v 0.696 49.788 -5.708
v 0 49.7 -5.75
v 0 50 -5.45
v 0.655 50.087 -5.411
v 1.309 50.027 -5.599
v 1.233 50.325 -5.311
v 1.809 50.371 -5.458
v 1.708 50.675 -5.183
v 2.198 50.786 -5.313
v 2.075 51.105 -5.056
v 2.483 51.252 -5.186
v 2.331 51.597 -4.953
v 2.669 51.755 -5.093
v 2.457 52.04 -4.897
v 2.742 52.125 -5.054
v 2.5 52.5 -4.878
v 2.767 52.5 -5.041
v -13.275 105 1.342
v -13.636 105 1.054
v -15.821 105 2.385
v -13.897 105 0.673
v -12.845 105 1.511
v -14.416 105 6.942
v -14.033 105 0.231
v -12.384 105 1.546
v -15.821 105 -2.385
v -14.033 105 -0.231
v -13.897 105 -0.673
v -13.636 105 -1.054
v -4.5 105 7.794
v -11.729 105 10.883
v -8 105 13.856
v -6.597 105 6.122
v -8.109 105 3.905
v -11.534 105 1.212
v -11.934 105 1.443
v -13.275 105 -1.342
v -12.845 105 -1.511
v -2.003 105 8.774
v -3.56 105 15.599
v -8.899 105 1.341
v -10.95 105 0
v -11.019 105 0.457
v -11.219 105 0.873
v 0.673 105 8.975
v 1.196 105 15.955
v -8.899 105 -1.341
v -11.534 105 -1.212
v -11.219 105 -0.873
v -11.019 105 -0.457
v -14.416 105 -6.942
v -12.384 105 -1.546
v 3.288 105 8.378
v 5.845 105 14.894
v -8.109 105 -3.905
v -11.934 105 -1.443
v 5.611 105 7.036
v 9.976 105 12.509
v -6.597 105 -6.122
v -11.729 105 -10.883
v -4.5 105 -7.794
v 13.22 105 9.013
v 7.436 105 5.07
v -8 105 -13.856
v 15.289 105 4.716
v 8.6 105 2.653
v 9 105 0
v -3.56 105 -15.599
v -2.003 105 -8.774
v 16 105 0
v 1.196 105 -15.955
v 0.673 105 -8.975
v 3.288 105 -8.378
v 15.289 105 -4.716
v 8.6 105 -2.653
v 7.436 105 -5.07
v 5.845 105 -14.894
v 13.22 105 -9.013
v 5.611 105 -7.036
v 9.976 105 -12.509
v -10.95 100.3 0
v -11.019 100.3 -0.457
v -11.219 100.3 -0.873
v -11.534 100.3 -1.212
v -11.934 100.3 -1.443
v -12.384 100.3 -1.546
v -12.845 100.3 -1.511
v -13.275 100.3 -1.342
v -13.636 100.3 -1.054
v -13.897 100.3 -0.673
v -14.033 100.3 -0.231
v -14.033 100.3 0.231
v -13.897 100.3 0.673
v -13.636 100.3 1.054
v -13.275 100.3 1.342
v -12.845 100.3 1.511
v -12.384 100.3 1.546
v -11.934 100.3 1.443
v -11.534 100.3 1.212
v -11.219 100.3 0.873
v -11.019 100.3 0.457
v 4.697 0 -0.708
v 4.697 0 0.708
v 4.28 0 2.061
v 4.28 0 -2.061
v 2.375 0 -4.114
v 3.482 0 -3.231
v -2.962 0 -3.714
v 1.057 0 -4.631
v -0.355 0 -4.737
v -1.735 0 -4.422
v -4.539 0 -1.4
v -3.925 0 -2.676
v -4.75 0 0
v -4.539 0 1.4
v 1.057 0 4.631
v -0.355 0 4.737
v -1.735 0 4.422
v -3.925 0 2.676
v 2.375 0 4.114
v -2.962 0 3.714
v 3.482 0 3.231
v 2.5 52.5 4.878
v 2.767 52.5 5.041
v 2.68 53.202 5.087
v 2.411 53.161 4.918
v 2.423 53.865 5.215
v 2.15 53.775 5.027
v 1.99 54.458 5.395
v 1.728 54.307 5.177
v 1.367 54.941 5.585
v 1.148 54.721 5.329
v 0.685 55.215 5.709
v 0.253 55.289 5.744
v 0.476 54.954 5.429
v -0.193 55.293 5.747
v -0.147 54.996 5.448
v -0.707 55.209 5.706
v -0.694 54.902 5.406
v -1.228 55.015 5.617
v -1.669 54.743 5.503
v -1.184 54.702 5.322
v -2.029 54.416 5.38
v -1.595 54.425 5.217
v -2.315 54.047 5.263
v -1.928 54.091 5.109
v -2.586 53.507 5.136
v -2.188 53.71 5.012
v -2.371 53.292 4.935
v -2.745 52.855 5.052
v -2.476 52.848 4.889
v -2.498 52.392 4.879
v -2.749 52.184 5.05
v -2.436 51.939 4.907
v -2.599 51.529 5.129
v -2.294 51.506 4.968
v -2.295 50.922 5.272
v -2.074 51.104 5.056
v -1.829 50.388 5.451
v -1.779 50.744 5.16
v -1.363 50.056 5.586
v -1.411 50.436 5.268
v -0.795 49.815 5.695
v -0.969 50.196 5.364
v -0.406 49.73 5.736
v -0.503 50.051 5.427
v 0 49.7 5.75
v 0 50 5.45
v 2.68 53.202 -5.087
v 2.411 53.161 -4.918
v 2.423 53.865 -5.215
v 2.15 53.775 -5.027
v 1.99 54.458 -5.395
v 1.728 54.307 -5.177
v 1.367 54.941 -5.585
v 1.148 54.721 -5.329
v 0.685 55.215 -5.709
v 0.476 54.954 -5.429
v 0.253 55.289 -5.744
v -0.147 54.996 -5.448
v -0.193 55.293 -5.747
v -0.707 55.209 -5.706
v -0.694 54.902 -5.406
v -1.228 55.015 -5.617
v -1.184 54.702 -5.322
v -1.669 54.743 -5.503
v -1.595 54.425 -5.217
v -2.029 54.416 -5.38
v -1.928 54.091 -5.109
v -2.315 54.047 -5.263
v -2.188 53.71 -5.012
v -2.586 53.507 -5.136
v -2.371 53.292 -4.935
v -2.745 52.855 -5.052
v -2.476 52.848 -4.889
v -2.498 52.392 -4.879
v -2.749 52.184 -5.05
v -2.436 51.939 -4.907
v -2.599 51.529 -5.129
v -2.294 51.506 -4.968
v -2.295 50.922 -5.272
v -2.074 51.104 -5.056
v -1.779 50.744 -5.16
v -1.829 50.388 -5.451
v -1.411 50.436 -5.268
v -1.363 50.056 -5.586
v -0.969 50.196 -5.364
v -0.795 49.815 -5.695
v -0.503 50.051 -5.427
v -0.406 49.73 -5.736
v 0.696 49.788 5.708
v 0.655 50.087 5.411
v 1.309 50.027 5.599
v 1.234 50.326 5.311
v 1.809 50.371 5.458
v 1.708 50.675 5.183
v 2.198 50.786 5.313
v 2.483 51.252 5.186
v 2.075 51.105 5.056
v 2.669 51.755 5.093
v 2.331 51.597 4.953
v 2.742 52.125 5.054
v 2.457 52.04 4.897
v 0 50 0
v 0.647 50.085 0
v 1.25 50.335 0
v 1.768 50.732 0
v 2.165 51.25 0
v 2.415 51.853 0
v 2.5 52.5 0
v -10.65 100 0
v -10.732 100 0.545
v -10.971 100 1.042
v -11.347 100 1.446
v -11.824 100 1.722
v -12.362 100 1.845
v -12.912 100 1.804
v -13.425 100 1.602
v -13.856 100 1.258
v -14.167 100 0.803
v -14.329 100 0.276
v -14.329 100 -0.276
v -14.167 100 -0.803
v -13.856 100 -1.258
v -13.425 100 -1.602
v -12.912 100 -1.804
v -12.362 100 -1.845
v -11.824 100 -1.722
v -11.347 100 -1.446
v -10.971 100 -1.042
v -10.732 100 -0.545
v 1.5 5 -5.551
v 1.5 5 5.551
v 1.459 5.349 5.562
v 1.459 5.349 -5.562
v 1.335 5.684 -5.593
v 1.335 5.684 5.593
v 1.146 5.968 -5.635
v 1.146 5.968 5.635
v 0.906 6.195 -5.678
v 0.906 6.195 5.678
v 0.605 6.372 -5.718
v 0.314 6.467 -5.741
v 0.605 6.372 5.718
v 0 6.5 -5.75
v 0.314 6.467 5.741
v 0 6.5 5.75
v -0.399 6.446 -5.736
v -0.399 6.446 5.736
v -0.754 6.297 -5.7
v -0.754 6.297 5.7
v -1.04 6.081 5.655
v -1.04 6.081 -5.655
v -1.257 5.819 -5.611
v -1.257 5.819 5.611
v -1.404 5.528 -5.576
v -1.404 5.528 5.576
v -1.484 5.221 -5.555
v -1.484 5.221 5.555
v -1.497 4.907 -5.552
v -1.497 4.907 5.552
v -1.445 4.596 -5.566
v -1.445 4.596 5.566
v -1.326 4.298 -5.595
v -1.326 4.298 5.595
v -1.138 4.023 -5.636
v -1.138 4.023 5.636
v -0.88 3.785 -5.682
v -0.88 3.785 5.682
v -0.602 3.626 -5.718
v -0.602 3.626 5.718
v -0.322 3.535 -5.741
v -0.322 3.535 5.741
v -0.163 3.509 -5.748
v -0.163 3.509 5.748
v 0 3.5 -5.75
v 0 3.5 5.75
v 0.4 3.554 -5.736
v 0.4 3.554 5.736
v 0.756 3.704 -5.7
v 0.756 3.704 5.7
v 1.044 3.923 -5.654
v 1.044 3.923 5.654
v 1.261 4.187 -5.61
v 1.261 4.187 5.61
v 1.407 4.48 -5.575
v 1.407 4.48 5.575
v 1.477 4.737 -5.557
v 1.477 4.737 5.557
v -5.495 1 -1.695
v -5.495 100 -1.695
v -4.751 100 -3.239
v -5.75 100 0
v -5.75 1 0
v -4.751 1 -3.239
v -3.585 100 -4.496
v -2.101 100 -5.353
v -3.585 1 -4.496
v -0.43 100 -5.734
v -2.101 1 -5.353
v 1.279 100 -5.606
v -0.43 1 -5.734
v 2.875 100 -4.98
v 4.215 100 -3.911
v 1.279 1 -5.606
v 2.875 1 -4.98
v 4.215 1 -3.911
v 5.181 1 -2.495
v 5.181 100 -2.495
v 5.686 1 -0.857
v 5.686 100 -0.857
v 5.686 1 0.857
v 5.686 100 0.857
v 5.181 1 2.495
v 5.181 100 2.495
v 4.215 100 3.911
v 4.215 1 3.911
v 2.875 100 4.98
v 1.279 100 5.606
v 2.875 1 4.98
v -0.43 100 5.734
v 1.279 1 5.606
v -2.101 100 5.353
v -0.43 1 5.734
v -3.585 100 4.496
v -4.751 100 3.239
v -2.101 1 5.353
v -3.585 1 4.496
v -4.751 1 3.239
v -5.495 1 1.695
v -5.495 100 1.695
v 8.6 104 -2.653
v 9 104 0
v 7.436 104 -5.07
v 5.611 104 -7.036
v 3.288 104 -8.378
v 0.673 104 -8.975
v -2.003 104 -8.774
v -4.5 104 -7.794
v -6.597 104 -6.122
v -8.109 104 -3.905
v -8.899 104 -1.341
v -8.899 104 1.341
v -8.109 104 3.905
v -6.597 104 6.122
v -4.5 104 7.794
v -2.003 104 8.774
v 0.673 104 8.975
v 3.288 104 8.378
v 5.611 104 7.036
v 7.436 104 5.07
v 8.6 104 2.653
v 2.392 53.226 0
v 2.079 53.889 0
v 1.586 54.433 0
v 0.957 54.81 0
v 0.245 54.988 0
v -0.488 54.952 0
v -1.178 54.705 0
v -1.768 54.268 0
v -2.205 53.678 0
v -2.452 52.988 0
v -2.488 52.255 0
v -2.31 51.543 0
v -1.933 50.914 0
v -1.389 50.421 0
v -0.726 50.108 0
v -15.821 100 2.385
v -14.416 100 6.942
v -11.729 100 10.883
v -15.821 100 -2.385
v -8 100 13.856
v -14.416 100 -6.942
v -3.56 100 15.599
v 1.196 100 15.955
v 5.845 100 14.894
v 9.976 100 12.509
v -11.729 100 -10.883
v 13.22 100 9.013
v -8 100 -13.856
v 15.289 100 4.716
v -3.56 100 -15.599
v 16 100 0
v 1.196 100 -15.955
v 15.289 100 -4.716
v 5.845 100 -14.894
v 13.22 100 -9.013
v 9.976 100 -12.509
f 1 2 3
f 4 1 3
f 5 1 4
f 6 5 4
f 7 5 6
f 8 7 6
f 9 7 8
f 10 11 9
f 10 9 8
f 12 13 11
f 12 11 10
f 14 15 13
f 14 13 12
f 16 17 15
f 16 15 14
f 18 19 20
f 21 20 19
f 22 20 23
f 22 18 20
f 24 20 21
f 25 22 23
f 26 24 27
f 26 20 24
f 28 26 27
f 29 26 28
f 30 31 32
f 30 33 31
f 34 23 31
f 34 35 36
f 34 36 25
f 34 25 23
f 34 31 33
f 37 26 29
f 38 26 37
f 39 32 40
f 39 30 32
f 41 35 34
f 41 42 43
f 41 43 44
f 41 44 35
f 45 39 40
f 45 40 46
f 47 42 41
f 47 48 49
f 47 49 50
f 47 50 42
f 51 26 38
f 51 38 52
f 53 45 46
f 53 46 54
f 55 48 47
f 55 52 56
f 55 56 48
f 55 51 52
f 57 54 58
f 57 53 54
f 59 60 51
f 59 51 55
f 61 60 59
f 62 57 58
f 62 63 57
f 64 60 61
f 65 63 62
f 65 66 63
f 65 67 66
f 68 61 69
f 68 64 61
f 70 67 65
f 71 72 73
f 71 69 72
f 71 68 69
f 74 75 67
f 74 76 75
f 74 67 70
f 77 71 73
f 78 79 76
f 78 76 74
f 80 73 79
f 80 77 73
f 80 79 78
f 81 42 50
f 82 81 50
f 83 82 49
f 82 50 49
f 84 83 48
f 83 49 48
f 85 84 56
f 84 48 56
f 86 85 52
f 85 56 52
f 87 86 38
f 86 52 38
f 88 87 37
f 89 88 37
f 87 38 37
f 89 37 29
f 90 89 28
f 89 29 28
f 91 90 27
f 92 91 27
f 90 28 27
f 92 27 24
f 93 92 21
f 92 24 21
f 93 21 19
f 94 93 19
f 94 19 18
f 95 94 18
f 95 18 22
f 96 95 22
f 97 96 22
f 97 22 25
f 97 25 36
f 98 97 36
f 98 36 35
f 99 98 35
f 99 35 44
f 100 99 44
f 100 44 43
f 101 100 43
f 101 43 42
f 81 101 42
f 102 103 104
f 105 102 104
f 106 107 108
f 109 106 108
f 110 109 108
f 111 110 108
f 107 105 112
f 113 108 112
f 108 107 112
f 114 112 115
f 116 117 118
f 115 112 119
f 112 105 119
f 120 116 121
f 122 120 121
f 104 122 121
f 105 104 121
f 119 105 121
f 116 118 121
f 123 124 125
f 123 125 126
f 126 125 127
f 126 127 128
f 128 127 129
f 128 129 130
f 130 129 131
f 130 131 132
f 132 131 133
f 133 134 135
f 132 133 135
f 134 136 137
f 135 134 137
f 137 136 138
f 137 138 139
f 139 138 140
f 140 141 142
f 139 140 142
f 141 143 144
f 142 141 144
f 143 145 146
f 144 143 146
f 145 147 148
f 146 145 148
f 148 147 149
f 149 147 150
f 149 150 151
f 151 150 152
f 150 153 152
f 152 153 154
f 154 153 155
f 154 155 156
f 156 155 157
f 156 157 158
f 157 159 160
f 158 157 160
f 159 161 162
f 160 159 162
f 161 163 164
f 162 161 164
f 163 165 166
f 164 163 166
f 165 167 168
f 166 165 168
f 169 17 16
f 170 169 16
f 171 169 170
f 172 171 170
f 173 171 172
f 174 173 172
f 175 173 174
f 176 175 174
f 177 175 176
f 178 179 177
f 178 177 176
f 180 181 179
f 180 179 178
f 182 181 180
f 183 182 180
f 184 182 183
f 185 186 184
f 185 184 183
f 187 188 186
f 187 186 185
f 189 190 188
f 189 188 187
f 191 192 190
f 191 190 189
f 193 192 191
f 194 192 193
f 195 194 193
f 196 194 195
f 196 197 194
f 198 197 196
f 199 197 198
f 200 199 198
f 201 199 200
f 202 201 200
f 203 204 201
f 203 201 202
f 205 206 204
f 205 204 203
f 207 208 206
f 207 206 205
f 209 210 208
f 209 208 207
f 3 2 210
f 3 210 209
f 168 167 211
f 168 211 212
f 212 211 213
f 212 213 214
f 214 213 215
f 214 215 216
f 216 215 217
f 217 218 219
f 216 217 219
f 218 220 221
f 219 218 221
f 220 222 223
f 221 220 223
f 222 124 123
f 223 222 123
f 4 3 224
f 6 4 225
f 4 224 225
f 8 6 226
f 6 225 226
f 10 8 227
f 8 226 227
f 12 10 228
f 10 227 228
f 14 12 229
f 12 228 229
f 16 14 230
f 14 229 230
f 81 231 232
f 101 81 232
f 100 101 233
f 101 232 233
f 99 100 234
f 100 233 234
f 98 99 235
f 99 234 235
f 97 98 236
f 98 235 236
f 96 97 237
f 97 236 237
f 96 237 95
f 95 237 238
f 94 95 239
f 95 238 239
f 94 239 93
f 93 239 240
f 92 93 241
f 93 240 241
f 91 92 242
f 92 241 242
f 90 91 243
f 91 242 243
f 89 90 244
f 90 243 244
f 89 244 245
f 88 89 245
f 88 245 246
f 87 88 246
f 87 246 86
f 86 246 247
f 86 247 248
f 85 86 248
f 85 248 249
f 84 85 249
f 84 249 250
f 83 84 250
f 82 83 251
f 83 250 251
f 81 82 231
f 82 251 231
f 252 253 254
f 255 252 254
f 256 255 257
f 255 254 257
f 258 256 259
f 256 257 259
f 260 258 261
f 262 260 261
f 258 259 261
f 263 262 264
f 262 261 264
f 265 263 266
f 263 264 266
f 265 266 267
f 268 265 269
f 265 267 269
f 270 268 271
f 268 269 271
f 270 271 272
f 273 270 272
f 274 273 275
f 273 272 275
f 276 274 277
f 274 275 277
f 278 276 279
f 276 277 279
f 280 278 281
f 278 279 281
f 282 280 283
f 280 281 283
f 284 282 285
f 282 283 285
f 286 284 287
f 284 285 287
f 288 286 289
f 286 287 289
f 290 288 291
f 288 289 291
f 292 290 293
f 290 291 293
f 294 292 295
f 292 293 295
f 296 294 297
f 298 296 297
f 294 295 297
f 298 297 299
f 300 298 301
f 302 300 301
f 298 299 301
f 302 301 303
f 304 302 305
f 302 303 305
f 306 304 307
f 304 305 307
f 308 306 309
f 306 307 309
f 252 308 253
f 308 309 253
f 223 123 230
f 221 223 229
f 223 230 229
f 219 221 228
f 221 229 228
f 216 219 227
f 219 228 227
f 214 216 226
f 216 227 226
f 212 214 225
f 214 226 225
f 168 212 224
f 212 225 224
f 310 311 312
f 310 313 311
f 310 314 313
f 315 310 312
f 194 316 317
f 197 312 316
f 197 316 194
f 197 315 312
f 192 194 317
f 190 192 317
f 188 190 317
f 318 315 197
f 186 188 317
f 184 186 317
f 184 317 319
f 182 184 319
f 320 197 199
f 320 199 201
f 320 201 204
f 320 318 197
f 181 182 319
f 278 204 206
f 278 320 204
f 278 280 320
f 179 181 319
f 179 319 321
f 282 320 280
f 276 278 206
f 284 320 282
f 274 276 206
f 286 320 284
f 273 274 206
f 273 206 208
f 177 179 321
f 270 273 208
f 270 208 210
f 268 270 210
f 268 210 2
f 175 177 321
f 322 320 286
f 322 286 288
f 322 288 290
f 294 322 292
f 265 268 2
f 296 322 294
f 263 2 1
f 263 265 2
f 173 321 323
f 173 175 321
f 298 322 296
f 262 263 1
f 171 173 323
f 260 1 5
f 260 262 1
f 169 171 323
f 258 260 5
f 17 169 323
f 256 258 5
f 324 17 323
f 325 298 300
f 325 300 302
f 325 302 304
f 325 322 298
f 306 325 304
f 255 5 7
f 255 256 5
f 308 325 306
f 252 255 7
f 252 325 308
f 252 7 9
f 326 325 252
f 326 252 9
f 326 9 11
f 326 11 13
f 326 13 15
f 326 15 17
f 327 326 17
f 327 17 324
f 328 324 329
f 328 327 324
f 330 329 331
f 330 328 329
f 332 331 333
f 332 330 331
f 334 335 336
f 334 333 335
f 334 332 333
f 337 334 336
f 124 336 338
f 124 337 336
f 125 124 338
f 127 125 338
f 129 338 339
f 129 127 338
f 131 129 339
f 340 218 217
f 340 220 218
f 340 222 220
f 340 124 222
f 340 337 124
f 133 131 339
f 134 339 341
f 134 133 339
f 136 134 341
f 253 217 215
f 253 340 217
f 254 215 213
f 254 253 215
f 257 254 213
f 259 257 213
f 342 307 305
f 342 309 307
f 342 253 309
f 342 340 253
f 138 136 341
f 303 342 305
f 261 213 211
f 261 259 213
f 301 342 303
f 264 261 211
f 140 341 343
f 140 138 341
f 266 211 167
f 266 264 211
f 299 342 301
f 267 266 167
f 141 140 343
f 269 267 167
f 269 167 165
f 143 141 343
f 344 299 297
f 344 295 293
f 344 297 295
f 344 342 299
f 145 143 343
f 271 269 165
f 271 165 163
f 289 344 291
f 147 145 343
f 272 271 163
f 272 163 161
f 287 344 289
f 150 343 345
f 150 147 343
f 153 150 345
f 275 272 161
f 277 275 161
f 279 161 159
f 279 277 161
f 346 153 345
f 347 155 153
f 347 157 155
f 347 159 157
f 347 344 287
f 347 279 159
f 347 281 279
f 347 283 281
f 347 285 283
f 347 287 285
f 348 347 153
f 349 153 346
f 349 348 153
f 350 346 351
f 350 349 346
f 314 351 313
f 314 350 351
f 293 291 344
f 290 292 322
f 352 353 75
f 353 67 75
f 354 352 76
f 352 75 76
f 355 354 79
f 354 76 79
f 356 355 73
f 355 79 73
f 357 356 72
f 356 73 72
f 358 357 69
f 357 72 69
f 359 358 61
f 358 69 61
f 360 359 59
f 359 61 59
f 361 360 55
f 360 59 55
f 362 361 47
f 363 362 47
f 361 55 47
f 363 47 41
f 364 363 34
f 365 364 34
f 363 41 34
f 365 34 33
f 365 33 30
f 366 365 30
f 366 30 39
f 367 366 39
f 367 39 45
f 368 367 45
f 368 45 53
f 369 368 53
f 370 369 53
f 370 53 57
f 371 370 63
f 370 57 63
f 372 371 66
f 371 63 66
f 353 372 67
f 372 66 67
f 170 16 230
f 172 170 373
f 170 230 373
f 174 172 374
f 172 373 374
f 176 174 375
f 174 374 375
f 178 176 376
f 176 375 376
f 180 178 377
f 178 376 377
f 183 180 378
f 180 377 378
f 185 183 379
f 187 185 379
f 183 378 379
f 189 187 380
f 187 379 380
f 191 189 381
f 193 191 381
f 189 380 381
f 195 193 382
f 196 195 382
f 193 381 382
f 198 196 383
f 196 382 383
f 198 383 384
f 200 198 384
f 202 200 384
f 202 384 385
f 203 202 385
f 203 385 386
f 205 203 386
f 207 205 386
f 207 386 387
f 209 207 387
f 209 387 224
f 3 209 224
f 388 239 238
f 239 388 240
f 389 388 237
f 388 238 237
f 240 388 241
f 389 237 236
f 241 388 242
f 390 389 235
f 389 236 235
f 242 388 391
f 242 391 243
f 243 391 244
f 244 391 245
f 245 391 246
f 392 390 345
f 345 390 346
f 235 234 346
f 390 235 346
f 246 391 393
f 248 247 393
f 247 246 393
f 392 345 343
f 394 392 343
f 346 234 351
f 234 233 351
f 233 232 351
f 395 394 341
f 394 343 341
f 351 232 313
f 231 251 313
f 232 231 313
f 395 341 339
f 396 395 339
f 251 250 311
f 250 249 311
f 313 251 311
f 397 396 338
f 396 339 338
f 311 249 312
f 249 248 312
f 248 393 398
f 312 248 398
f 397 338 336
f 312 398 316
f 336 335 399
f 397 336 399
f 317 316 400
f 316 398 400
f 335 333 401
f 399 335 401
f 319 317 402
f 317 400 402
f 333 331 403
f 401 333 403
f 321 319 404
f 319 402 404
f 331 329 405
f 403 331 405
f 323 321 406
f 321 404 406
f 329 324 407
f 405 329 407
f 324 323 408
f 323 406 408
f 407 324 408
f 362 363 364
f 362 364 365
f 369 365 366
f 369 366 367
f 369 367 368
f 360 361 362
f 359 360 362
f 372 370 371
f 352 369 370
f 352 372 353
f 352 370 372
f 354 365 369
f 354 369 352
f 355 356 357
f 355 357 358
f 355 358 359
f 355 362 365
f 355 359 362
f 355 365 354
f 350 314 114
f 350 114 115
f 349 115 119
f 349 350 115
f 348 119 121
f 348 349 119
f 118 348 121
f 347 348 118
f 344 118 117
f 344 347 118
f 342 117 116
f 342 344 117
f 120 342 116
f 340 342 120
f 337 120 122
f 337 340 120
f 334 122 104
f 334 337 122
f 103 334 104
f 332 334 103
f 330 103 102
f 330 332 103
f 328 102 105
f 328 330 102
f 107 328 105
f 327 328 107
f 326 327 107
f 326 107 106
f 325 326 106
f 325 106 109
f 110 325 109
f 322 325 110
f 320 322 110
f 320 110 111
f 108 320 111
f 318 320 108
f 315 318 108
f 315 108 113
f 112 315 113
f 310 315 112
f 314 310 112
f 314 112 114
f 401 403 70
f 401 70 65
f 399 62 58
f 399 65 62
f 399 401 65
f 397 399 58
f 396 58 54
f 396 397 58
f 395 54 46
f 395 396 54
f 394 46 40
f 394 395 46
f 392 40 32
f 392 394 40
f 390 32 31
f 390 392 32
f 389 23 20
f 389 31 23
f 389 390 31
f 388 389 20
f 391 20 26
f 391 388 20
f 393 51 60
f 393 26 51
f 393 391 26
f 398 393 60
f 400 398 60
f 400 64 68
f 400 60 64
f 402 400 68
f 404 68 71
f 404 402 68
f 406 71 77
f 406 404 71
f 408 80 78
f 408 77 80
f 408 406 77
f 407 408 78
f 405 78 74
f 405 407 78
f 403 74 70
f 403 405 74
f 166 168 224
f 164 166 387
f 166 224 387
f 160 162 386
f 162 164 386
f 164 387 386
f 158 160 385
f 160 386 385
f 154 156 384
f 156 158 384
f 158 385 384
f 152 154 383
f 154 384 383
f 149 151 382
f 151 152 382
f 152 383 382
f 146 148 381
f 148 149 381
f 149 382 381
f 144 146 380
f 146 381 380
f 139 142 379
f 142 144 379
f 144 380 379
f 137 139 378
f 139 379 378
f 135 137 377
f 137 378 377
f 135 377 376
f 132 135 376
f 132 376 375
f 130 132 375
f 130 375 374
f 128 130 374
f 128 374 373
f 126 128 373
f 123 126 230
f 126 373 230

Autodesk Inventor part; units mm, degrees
ref_plane "YZ Plane" through (0, 0, 0) normal (1, 0, 0) x (0, 1, 0)
ref_plane "XZ Plane" through (0, 0, 0) normal (0, 1, 0) x (-1, 0, 0)
sketch "Sketch1" plane through (0, 0, 0) normal (0, 1, 0) x (-1, 0, 0)
  circle A0 centre (0, 0) radius 5.75
  dimension "d0" = 11.5
extrude "Extrusion1" add sketch "Sketch1" along normal blind 100
sketch "Sketch2" plane through (0, 100, 0) normal (0, 1, 0) x (1, 0, 0)
  circle A0 centre (0, 0) radius 16
  dimension "d3" = 32
extrude "Extrusion2" add sketch "Sketch2" along normal blind 5
sketch "Sketch3" plane through (0, 105, 0) normal (0, 1, 0) x (1, 0, 0)
  circle A0 centre (0, 0) radius 9
  dimension "d6" = 18
extrude "Extrusion3" cut sketch "Sketch3" against normal blind 1
ref_plane "Work Plane1" through (0, 0, 5.75) normal (0, 0, 1) x (1, 0, 0)
sketch "Sketch4" plane through (0, 0, 5.75) normal (0, 0, 1) x (1, 0, 0)
  line L0 (5.75, 100) -> (-5.75, 100) projected
  line L1 (5.75, 0) -> (-5.75, 0) projected
  line L2 (0, 0) -> (0, 5)
  circle A0 centre (0, 5) radius 1.5
  dimension "d9" = 5
  dimension "d10" = 3
extrude "Extrusion4" cut sketch "Sketch4" against normal blind 11.5
chamfer "Chamfer1" distance 1 angle 45 1 edges at (5.75, 0, 0)
sketch "Sketch5" plane through (0, 0, 0) normal (0, 0, 1) x (1, 0, 0)
  line L0 (0, 0) -> (0, 42.5)
  line L1 (0, 42.5) -> (0, 32.5)
  line L2 (0, 42.5) -> (0, 52.5)
  circle A0 centre (0, 52.5) radius 2.5
  dimension "d16" = 42.5
  dimension "d17" = 10
  dimension "d18" = 10
  dimension "d19" = 5
extrude "Extrusion5" cut sketch "Sketch5" along normal mid plane 13
sketch "Sketch7" plane through (0, 105, 0) normal (0, 1, 0) x (1, 0, 0)
  circle A0 centre (0, 0) radius 9 projected
  line L0 (-9, 0) -> (-16, 0)
  circle A1 centre (0, 0) radius 16 projected
  circle A2 centre (-12.5, 0) radius 1.55
  dimension "d22" = 3.1
extrude "Extrusion6" cut sketch "Sketch7" against normal up to surface (5 mm away) contours A2 L0 | L0 A2
chamfer "Chamfer2" distance 0.3 angle 45 1 edges at (-14.05, 100, 0)
chamfer "Chamfer3" distance 0.3 angle 45 2 edges at (-2.5, 52.5, 5.1781) (-2.5, 52.5, -5.1781)
properties part number "wał_hamulca" material "ABS Plastic"
